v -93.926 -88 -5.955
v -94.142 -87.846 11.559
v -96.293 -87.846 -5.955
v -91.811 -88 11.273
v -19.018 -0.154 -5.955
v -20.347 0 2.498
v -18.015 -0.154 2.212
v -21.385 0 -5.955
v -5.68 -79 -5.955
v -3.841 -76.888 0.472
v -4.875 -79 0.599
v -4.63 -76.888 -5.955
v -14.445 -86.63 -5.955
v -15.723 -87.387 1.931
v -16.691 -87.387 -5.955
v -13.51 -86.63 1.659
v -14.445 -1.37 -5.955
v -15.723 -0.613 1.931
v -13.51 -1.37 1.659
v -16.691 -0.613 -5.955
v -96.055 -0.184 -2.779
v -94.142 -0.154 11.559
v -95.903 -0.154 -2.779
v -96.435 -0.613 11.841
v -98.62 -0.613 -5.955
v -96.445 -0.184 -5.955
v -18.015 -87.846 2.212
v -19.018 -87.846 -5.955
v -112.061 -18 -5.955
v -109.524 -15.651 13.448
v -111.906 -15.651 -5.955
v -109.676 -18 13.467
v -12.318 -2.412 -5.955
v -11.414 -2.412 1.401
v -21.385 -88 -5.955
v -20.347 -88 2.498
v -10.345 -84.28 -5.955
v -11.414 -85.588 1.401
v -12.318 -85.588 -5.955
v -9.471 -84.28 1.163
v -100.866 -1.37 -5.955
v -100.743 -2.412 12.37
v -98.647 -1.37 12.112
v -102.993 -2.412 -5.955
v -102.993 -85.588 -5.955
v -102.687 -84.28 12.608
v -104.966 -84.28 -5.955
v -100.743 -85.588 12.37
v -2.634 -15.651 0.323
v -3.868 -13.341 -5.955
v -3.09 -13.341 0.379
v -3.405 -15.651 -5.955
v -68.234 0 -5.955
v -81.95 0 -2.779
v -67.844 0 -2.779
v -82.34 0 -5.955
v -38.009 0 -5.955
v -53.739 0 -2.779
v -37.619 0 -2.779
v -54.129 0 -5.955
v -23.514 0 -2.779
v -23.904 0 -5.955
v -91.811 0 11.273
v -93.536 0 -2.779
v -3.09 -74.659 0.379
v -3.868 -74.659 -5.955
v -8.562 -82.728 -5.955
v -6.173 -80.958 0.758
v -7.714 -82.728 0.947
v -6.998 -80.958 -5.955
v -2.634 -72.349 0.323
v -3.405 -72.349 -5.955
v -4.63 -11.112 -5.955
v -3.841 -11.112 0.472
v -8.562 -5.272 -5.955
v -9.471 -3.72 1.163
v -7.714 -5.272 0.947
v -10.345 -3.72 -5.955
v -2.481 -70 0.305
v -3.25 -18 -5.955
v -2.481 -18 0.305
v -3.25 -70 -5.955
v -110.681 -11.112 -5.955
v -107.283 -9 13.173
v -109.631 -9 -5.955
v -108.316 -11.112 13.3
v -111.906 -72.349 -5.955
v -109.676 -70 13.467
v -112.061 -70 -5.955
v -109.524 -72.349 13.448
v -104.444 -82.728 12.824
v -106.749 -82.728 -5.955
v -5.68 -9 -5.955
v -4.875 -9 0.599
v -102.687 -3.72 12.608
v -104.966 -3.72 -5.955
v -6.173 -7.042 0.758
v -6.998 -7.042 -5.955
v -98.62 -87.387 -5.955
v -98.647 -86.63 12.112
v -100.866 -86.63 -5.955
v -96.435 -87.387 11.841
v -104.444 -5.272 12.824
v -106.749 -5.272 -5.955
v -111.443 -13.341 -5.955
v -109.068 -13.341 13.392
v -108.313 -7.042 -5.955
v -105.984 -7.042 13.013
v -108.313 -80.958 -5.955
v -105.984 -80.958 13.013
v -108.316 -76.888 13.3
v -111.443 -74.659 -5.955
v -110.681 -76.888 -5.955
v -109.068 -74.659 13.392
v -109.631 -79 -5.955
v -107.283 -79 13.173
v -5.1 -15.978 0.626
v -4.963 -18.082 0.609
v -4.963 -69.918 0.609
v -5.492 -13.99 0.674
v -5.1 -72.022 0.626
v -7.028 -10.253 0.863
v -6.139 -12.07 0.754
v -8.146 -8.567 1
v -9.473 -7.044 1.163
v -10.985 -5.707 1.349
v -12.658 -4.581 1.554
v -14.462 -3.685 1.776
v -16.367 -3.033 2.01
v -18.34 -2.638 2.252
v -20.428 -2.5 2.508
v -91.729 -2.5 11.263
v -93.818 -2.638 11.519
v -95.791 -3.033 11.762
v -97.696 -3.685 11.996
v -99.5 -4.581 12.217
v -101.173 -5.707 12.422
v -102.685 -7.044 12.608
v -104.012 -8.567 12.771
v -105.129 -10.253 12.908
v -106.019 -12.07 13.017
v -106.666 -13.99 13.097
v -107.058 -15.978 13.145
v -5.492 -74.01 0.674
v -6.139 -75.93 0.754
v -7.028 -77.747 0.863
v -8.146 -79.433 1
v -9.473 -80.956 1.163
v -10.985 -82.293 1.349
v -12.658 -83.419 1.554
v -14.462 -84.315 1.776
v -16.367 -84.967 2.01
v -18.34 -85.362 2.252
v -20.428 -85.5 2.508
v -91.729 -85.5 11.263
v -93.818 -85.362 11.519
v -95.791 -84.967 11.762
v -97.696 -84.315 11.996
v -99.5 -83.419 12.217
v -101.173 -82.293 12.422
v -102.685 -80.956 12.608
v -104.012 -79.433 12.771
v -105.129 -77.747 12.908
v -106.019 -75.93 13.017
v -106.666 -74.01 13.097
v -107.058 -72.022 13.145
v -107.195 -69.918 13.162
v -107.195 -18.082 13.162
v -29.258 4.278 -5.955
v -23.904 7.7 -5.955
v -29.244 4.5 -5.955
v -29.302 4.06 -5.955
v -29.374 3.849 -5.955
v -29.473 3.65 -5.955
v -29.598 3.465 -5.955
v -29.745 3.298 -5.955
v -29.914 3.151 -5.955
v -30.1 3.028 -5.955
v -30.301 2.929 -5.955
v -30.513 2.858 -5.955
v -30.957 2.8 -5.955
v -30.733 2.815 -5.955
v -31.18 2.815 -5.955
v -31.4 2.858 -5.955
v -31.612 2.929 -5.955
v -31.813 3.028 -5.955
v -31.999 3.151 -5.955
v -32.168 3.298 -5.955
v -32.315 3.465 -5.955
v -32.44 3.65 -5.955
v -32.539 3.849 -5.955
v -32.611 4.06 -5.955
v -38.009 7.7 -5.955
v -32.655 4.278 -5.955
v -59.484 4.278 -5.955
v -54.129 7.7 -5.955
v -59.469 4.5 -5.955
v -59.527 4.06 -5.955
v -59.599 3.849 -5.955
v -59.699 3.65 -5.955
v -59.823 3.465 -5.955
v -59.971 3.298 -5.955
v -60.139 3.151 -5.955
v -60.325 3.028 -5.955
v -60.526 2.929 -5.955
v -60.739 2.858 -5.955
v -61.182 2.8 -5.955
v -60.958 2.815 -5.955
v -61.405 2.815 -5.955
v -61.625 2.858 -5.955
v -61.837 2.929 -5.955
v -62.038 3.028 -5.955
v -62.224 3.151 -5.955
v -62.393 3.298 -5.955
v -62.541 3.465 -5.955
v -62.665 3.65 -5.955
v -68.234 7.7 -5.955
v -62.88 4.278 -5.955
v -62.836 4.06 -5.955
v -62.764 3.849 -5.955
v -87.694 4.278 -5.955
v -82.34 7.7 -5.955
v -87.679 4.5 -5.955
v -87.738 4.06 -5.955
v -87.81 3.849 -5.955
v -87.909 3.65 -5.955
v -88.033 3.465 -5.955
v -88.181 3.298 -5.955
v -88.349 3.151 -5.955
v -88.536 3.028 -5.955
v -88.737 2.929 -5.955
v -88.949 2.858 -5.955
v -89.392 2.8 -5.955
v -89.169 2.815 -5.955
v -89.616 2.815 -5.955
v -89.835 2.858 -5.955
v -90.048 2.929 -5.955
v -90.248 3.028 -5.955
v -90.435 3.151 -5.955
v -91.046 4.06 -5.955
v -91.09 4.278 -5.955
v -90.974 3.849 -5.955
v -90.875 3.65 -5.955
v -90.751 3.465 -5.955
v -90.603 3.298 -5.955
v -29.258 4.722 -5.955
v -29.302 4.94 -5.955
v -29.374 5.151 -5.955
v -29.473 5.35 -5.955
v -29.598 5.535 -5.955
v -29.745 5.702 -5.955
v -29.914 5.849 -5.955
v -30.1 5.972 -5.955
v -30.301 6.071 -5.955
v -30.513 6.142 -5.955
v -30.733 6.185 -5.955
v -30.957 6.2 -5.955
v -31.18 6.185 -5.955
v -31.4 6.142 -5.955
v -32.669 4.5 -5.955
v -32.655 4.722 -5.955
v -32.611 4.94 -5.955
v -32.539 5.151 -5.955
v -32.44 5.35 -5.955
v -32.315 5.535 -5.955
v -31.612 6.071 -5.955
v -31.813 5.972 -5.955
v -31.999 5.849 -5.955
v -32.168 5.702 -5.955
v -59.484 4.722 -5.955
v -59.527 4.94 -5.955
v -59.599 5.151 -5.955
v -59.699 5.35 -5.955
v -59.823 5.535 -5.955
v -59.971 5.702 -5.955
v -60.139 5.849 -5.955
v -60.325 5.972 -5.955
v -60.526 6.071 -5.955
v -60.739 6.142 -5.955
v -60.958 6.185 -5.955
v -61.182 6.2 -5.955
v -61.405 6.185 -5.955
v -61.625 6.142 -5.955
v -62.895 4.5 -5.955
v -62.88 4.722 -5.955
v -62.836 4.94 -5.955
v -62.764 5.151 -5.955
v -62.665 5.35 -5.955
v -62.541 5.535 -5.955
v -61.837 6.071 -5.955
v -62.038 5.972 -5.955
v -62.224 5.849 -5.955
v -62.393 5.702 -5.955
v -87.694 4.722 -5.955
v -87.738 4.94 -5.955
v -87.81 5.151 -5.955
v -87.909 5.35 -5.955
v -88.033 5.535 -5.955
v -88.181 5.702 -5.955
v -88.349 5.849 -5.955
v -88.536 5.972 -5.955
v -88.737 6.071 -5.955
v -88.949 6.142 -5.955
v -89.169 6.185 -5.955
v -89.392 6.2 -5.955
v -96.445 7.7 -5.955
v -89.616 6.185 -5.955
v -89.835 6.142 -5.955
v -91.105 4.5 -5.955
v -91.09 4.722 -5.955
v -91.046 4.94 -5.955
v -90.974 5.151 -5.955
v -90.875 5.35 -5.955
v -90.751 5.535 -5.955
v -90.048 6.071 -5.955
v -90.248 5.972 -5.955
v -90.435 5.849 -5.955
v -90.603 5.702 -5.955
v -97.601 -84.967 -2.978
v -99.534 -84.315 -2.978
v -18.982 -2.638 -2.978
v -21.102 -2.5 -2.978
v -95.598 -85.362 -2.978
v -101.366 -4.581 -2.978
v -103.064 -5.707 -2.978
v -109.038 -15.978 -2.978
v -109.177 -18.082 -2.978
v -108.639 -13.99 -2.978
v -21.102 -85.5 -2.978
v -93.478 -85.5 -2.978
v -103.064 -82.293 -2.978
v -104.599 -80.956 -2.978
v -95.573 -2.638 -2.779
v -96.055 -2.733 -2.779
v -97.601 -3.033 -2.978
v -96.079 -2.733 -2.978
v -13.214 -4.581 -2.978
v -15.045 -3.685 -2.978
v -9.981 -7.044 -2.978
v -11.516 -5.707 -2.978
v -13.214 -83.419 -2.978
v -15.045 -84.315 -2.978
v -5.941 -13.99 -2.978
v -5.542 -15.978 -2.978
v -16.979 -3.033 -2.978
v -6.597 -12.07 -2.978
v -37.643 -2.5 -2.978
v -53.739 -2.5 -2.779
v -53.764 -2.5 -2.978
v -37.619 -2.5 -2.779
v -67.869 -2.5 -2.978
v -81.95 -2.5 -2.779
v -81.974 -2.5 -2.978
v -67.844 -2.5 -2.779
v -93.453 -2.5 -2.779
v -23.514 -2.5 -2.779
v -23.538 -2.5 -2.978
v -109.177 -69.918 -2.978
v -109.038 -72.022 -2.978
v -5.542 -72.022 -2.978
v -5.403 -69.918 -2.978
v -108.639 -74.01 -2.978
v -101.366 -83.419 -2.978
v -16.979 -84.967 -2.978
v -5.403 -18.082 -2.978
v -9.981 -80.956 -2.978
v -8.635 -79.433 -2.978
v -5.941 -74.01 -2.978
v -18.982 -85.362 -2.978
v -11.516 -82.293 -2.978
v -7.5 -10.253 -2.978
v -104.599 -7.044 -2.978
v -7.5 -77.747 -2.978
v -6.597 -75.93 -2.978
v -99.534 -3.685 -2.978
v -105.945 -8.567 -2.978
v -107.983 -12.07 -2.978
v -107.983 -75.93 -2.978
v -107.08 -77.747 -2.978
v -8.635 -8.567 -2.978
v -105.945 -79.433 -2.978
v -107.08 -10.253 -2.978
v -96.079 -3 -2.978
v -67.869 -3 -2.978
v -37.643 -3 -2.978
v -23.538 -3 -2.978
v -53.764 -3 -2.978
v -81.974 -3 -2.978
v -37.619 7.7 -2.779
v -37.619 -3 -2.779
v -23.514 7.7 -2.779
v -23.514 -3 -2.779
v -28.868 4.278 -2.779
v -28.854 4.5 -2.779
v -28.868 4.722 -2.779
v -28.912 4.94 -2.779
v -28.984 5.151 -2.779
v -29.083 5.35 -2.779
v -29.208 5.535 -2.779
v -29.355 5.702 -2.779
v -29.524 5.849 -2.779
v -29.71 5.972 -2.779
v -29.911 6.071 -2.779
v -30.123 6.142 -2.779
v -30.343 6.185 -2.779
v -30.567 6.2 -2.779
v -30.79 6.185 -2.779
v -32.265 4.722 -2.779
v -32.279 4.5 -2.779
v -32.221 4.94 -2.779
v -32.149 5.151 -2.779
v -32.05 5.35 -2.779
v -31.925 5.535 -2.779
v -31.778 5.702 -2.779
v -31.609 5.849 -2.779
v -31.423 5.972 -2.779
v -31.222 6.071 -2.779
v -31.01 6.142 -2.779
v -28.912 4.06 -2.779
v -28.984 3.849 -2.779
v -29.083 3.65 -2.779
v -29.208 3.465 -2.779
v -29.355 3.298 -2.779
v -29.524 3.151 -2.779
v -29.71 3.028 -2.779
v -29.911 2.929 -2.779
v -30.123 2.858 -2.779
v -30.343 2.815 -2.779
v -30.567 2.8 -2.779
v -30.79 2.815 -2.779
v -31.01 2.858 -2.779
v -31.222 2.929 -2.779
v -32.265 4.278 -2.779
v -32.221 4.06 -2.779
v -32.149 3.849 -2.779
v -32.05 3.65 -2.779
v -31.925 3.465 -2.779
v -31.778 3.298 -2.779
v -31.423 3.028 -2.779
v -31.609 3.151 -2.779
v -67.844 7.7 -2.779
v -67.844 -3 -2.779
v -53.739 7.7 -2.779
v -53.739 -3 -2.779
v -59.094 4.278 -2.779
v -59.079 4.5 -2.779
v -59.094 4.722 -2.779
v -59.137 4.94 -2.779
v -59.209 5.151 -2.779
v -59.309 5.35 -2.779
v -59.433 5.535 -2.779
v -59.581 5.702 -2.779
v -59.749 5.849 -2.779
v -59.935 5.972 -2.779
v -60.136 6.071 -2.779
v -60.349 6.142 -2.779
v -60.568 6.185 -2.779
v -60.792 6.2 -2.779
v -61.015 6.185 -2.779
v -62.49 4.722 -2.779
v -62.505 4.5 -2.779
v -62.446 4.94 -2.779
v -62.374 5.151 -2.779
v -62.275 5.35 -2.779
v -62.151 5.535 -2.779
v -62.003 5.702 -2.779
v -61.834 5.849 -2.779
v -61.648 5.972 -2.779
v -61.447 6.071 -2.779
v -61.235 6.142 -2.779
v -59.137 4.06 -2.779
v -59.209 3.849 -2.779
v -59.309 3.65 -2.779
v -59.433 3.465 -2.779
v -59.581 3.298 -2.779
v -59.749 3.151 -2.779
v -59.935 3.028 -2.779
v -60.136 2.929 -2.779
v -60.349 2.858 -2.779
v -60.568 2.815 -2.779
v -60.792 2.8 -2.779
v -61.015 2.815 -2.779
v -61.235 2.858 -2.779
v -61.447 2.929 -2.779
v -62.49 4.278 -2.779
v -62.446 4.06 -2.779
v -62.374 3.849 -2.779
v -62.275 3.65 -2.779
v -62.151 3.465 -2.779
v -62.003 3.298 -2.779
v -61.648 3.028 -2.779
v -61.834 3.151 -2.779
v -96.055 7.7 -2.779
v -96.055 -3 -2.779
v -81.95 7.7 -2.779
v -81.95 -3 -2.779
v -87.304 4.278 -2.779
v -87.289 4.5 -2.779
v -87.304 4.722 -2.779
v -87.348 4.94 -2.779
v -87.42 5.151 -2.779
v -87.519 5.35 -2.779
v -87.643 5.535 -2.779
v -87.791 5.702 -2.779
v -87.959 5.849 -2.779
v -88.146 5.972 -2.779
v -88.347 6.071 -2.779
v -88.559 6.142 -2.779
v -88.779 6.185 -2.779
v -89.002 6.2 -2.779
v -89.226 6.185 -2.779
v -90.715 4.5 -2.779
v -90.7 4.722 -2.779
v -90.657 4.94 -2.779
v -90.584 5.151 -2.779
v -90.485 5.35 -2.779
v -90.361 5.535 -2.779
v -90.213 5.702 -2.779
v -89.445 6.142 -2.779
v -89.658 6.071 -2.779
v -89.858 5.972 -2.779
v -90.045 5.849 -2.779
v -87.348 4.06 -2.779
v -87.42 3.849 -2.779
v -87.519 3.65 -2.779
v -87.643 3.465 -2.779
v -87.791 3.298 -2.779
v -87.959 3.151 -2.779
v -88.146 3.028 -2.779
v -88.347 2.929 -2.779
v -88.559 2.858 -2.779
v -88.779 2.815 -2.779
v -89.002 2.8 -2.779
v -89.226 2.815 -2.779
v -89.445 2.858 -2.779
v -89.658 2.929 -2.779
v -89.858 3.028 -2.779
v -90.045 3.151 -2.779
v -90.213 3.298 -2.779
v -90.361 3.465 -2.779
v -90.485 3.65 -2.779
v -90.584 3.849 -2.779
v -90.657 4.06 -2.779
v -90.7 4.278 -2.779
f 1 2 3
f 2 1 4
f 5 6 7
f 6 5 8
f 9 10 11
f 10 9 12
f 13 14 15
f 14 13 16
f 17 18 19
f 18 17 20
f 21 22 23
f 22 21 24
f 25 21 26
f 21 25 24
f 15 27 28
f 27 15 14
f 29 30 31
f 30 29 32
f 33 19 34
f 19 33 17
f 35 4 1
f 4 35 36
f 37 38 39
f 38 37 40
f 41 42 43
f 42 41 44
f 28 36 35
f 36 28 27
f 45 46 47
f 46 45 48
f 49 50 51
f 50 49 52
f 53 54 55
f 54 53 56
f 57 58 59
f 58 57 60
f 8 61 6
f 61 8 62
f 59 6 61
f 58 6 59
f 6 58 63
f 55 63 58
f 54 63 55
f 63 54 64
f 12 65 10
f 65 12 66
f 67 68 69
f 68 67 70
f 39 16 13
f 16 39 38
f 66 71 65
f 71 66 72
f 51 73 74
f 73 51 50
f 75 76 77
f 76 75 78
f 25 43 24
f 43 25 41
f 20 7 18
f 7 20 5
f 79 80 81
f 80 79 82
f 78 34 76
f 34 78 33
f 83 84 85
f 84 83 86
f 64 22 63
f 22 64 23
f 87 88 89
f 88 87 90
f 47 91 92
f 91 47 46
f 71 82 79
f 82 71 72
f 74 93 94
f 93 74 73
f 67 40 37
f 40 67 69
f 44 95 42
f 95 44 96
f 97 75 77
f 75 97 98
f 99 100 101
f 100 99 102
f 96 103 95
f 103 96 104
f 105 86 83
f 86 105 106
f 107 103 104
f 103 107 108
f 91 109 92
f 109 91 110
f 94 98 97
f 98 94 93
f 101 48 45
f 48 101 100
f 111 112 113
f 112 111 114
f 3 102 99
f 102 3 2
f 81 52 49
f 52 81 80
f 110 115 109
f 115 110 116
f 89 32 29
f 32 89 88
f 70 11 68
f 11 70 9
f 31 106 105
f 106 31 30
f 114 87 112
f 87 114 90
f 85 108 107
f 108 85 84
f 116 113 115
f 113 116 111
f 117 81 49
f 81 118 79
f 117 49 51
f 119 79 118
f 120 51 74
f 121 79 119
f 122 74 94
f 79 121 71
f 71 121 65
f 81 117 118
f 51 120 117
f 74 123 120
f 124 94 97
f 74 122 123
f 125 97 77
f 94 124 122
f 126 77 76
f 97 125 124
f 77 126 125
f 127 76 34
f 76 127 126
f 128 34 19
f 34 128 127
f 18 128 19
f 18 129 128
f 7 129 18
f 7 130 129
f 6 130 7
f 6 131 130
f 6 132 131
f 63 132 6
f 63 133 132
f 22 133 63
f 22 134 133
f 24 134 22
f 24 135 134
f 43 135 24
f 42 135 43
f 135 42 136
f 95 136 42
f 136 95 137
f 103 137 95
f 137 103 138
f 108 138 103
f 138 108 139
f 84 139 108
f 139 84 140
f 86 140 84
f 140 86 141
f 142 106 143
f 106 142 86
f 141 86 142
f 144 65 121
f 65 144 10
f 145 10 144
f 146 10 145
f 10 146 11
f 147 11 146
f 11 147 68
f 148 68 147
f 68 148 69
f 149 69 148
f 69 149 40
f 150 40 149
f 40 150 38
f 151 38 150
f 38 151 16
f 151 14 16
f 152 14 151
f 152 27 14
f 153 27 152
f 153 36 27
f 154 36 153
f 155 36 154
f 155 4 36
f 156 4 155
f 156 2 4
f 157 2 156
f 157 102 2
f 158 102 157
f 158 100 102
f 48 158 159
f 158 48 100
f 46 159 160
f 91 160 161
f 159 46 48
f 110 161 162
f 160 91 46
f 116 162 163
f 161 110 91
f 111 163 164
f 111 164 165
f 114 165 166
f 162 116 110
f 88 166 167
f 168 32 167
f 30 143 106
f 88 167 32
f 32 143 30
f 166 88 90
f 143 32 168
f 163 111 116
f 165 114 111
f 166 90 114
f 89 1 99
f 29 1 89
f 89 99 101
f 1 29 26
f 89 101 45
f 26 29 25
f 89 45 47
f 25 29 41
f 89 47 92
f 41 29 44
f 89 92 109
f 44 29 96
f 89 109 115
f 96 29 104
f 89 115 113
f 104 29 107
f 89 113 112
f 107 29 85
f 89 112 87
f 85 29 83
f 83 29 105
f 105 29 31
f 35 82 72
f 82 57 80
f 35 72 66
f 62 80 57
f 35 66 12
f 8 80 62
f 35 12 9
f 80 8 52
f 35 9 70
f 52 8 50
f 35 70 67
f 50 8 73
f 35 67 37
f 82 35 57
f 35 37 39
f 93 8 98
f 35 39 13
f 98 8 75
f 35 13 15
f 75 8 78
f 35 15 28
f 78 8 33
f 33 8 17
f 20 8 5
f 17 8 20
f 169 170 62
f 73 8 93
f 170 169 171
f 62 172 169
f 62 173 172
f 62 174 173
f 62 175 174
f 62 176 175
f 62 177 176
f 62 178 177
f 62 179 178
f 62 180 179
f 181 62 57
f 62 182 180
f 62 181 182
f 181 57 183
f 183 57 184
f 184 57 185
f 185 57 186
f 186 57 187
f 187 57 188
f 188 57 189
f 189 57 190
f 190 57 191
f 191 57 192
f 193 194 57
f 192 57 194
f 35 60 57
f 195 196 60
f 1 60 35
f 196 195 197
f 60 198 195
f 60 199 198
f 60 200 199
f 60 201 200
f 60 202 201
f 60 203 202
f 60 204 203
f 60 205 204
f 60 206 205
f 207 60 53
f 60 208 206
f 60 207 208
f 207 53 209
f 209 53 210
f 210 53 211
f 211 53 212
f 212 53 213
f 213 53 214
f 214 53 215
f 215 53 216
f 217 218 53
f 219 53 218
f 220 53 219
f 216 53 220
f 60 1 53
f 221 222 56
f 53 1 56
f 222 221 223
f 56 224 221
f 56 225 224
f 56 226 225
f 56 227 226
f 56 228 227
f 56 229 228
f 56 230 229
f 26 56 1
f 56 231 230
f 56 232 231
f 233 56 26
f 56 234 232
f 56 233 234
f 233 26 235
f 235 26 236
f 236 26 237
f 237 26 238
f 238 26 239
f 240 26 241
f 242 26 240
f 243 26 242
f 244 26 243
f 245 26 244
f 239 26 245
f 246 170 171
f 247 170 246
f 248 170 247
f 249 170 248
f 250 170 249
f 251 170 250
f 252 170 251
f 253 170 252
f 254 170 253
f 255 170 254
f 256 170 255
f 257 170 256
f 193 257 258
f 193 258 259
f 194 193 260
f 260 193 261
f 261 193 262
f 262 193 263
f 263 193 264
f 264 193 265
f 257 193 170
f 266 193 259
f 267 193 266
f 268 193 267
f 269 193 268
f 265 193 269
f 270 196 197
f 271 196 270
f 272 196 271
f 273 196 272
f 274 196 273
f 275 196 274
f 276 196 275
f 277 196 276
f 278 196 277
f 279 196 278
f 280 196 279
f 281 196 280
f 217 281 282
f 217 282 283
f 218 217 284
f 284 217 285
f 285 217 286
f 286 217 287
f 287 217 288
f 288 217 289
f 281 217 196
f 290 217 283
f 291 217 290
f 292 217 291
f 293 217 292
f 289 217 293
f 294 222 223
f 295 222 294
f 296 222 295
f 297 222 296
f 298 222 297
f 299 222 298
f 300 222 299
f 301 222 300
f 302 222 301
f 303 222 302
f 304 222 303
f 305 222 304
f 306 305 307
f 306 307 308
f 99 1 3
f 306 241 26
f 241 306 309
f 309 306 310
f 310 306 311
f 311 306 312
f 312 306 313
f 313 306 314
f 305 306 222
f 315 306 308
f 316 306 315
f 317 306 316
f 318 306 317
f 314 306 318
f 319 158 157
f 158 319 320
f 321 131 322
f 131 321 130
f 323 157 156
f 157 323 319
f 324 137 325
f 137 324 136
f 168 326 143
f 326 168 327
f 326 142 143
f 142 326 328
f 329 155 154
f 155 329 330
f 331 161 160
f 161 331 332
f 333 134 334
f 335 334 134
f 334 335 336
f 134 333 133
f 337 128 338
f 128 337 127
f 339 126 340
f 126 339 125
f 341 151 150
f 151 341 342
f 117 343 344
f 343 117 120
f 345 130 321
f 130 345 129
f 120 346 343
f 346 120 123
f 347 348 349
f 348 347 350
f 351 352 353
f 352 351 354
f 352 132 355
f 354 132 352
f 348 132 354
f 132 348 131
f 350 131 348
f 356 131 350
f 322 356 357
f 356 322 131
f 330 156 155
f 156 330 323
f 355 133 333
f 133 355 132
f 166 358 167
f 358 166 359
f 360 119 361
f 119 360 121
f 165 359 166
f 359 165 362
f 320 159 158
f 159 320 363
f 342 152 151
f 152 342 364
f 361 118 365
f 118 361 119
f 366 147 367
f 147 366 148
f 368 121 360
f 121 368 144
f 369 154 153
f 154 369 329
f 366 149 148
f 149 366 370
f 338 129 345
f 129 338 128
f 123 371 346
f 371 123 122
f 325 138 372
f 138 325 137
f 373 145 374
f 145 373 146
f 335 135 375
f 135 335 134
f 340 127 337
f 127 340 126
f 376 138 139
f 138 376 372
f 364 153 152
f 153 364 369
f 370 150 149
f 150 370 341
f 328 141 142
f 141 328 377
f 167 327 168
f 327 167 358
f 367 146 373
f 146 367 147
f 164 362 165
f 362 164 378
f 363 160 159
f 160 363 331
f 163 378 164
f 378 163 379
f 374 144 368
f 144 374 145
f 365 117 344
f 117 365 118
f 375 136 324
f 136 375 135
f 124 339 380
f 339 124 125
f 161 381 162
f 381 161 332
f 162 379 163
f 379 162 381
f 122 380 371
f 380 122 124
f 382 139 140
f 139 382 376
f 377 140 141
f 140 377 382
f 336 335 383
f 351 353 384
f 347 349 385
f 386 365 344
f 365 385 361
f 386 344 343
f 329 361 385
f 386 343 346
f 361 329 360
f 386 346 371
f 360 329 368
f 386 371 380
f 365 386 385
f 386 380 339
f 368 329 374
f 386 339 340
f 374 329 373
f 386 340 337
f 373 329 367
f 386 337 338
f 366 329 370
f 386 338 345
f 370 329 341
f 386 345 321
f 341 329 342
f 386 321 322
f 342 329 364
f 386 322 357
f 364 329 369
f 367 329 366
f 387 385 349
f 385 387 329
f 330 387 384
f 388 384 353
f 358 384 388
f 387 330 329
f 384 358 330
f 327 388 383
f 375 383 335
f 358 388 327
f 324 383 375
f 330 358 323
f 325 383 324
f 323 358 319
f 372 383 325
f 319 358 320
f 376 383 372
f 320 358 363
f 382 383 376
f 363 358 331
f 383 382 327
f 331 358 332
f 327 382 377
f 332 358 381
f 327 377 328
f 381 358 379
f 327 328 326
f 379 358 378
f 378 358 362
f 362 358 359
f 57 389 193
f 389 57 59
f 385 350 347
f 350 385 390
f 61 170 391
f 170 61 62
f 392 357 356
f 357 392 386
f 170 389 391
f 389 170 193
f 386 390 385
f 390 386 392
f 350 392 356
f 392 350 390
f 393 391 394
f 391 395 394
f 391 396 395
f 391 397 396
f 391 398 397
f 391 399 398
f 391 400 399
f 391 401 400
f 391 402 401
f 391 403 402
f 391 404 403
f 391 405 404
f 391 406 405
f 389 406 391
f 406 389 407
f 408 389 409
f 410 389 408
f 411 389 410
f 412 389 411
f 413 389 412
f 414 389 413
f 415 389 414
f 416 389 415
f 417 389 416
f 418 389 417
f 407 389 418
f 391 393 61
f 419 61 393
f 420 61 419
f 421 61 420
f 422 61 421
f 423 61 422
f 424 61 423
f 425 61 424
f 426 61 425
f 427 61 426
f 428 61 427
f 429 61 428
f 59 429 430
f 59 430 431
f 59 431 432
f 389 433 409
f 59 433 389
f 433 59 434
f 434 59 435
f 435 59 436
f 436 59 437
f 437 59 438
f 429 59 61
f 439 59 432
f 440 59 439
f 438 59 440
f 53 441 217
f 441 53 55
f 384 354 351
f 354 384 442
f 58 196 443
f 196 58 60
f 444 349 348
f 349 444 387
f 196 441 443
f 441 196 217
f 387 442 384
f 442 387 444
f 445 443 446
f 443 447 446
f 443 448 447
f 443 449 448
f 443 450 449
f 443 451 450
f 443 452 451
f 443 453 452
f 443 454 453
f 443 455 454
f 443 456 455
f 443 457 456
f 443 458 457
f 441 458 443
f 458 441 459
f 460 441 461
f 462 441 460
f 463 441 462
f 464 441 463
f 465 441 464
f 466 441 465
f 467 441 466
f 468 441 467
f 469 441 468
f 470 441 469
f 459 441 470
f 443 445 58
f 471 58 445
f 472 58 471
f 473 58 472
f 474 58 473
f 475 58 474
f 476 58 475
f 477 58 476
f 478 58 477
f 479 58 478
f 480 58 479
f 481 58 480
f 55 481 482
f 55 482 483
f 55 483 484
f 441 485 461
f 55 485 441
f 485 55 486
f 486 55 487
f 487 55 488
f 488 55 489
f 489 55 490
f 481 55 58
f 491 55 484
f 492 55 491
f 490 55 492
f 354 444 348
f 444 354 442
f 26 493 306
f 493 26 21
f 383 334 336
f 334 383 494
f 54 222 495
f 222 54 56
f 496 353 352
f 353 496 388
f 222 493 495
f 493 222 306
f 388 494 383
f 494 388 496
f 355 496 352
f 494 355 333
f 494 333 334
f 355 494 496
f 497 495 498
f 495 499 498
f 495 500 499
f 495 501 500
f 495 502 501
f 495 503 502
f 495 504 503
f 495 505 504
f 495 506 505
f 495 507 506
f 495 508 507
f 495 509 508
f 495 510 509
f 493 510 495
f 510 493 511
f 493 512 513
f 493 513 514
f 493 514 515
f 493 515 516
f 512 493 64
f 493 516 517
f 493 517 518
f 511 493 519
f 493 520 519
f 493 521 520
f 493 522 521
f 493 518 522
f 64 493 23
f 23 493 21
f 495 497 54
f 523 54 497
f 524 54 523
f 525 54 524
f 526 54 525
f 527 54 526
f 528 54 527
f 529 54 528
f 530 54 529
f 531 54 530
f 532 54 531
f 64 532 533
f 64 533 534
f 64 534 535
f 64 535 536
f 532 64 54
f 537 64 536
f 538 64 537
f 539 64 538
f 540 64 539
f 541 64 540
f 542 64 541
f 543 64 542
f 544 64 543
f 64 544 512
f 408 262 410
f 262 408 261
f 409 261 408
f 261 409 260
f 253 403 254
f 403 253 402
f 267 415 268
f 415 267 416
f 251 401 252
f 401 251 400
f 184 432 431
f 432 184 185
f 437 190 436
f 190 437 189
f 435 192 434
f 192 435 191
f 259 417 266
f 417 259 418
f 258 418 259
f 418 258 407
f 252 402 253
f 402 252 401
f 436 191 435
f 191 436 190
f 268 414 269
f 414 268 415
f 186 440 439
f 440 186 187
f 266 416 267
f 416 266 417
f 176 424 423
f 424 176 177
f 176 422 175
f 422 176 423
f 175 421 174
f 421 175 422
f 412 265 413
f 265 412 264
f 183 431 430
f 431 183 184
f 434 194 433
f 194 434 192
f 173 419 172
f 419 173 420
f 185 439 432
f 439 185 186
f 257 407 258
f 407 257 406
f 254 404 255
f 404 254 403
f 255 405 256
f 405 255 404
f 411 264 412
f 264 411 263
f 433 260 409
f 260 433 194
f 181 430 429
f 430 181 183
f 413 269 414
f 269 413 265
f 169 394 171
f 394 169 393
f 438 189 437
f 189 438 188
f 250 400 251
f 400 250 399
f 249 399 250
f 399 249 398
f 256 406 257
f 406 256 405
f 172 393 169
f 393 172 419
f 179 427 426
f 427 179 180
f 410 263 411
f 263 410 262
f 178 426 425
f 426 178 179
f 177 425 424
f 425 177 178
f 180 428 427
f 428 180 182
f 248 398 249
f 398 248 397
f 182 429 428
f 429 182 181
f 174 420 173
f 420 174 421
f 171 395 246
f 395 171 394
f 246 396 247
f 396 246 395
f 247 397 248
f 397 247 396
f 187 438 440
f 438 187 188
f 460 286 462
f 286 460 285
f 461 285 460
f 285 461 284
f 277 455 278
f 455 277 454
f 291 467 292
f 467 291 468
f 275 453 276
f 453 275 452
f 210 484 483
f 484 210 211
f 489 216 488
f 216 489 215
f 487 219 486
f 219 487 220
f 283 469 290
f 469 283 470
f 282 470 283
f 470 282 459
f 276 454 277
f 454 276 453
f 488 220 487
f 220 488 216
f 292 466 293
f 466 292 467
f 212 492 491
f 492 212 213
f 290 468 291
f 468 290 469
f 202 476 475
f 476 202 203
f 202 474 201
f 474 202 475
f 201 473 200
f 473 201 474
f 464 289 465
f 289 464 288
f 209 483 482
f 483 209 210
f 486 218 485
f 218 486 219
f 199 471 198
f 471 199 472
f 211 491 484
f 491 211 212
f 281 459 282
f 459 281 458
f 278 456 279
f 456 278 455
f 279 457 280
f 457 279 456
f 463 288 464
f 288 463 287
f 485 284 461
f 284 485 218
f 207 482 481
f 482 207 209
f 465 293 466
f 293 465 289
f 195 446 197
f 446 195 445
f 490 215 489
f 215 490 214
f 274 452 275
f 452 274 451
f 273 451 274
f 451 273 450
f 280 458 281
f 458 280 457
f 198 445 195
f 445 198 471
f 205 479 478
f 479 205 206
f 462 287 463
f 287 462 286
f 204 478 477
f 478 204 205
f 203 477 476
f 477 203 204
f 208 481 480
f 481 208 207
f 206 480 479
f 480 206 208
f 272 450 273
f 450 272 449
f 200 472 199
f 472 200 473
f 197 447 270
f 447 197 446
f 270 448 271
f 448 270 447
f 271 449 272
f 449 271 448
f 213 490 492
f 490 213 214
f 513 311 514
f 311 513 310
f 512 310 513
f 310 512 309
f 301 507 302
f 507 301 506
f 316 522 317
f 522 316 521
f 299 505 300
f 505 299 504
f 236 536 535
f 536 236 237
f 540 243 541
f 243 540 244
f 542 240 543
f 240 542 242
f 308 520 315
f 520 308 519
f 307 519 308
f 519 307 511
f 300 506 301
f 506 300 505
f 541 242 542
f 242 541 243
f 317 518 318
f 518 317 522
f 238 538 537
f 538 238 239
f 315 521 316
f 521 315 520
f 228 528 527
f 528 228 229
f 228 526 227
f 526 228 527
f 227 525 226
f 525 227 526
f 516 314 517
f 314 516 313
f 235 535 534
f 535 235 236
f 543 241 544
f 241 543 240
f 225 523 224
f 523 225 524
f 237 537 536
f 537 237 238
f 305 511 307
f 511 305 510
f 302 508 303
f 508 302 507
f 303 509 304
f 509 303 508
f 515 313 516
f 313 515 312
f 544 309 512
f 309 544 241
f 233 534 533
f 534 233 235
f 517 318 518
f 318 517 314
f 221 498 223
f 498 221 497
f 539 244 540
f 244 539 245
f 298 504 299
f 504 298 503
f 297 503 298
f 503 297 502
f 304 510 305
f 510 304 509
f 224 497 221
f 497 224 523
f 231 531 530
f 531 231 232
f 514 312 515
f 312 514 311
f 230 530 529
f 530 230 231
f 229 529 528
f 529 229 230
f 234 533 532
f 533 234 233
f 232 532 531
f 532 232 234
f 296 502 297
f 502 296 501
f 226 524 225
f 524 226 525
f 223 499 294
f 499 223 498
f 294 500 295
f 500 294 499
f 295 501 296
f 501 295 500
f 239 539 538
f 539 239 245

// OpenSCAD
// file: ../keyball61_outline.scad
// 自動生成: scripts/extract_outline.py による Keyball61 BallSide 底板の実寸データ
// 座標系: 左手ユニットを上から見た形 / 原点=外形バウンディングボックスの南西角 / +Y=奥(北)
// 編集しないこと。再生成: python3 scripts/extract_outline.py <DXF>
plate_w = 142.99;
plate_d = 113.53;
plate_outline = [
  [70.469,105.952],
  [71.227,105.880],
  [80.812,104.031],
  [81.588,103.958],
  [100.075,104.045],
  [100.583,104.091],
  [119.410,107.418],
  [119.914,107.553],
  [136.160,113.466],
  [136.328,113.511],
  [136.502,113.527],
  [136.676,113.511],
  [136.844,113.466],
  [137.002,113.393],
  [137.145,113.293],
  [137.268,113.169],
  [137.368,113.027],
  [137.442,112.869],
  [142.931,97.786],
  [142.980,97.597],
  [142.990,97.401],
  [142.963,97.207],
  [142.898,97.022],
  [142.798,96.853],
  [142.667,96.707],
  [142.510,96.589],
  [142.334,96.505],
  [134.323,93.589],
  [133.849,93.368],
  [133.421,93.068],
  [133.051,92.698],
  [132.751,92.270],
  [132.530,91.796],
  [132.395,91.291],
  [132.349,90.770],
  [132.349,66.014],
  [132.366,65.834],
  [132.414,65.660],
  [132.493,65.498],
  [132.600,65.353],
  [132.731,65.228],
  [132.882,65.130],
  [133.048,65.060],
  [133.215,64.991],
  [133.367,64.892],
  [133.498,64.768],
  [133.604,64.623],
  [133.683,64.461],
  [133.732,64.286],
  [133.748,64.107],
  [133.748,29.050],
  [133.748,6.000],
  [133.729,5.805],
  [133.672,5.618],
  [133.580,5.445],
  [133.455,5.293],
  [133.304,5.169],
  [133.131,5.076],
  [132.943,5.019],
  [132.748,5.000],
  [95.252,5.000],
  [95.056,4.981],
  [94.869,4.925],
  [94.696,4.832],
  [94.544,4.707],
  [94.420,4.556],
  [94.328,4.383],
  [94.271,4.195],
  [94.252,4.001],
  [94.252,3.501],
  [94.232,3.305],
  [94.175,3.118],
  [94.083,2.945],
  [93.959,2.793],
  [93.807,2.669],
  [93.634,2.577],
  [93.447,2.520],
  [93.251,2.500],
  [76.201,2.500],
  [76.006,2.481],
  [75.819,2.424],
  [75.646,2.332],
  [75.494,2.207],
  [75.370,2.056],
  [75.277,1.883],
  [75.220,1.696],
  [75.201,1.500],
  [75.201,1.001],
  [75.182,0.805],
  [75.125,0.617],
  [75.033,0.445],
  [74.908,0.293],
  [74.757,0.169],
  [74.584,0.077],
  [74.396,0.019],
  [74.201,0.000],
  [58.151,0.000],
  [57.977,0.015],
  [57.809,0.061],
  [57.651,0.134],
  [57.508,0.234],
  [57.385,0.358],
  [57.285,0.500],
  [57.211,0.658],
  [57.166,0.827],
  [57.151,1.001],
  [57.151,3.700],
  [57.132,3.895],
  [57.075,4.083],
  [56.982,4.256],
  [56.858,4.407],
  [56.706,4.532],
  [56.534,4.624],
  [56.346,4.681],
  [56.151,4.700],
  [39.101,4.700],
  [38.927,4.715],
  [38.758,4.761],
  [38.600,4.834],
  [38.458,4.935],
  [38.334,5.057],
  [38.235,5.200],
  [38.161,5.358],
  [38.116,5.527],
  [38.101,5.700],
  [38.101,10.700],
  [38.081,10.895],
  [38.024,11.083],
  [37.932,11.256],
  [37.808,11.408],
  [37.656,11.532],
  [37.483,11.624],
  [37.296,11.681],
  [37.101,11.701],
  [19.050,11.701],
  [1.000,11.701],
  [0.805,11.720],
  [0.617,11.777],
  [0.445,11.869],
  [0.293,11.993],
  [0.168,12.145],
  [0.076,12.317],
  [0.019,12.506],
  [0.000,12.701],
  [0.000,104.952],
  [0.015,105.125],
  [0.060,105.294],
  [0.134,105.452],
  [0.234,105.595],
  [0.357,105.718],
  [0.500,105.818],
  [0.658,105.892],
  [0.826,105.937],
  [1.000,105.952],
  [19.050,105.952]
];
// [x, y, 直径] : d=11.3 はボール取出し穴, d=2.08 は M2, d=2.36 はボールケース部
plate_holes = [
  [71.961,95.252,12.0],
  [61.104,103.252,2.5],
  [61.104,87.252,2.5],
  [56.455,61.351,2.2],
  [128.785,88.912,2.2],
  [57.292,18.55,2.2],
  [18.773,87.402,2.2],
  [18.773,30.251,2.2],
  [94.556,21.051,2.2],
  [95.392,61.651,2.2],
  [120.871,101.715,2.2]
];
// file: ../params.scad
// ============================================================
// Keyball61 ラップボード(膝上ケース・固定式) 共通パラメータ
// 座標系: X+ = 右(東), Y+ = 奥(北), Z+ = 上
// 組立座標系(グローバル): 中心 x=0, 手前が y小
// ============================================================

clr = 0.35;           // はめあいクリアランス(片側)

// ---------- 全体レイアウト(固定) ----------
splay        = 10;    // ハの字角(固定)。変更したら全パーツ再印刷
tent_angle   = 7;     // テンティング角(内側が高い)
kb_corner_x  = 45;    // キーボードブロック後内側コーナーの中心からの距離(=後方ギャップの半分)
kb_corner_y  = 238;   // 同コーナーのY

// ---------- サイドピース(キーボードブロック+パームレスト) ----------
kb_wall      = 6;     // ポケット周囲の壁厚
wedge_t0     = 6;     // 楔の最低肉厚(外側端)
palm_w       = 108;   // パームレスト幅。親指側(内側)を削って印刷を安定させる
palm_x0      = 2.5;   // パームの外側エッジ位置(kbフレームx)。外側基準で幅を詰める
palm_d       = 88;    // 同奥行き
palm_overlap = 3;     // キーボードブロックへの食い込み
palm_r       = 18;    // 角R
// ブレース南帯のネジ座/座面が載る内側エッジ沿いの支持アーム
// (パームを削ってもブレース・ブリッジとの接合部を変えないために残す)
palm_arm_w   = 14;    // アーム幅(継ぎ目から西へ)
palm_arm_y0  = -32;   // アーム南端(kbフレームy)
palm_fillet  = 22;    // アーム〜パーム間の凹R(尖り解消の滑らかな輪郭)
// キーボードは「ベッド直接印刷の2mm取付プレート」(mount_plate)に純正ネジで固定し、
// プレートごとポケットに落としてM3x8皿でサイドに固定する。
// (楔内部の座ぐり奥の2mm肉は印刷精度が出ずネジ固定に失敗したため=実印刷での知見)
plate_t      = 2;     // 取付プレート厚(=アクリル板厚。純正ネジ長がそのまま使える)
pocket_depth = 4.6;   // ポケット深さ = plate_t + 縁2.6
// プレート固定ネジ位置(プレート座標系, M3x8皿セルフタップ x4/側)
// 組立順: 先にプレート単体をサイドへ上から固定 → キーボードをΦ8貫通穴経由で下から純正ネジ止め
plate_screws = [[35, 14], [95, 14], [35, 96], [105, 99]];
kb_head_hole_d = 8;   // M2/ボールケースネジ頭の逃げ穴(サイド側, 貫通=下から増し締め可)

ball_hole_d  = 12;    // ボール取出し穴(アクリルは11.3)

// 取付プレートの穴径
m2_hole_d  = 2.4;     // M2クリアランス(プレート側)
bc_hole_d  = 2.8;     // ボールケースネジ(プレート側, アクリルは2.36)

// ボールPCB切り欠き部の逃げ(取付面からさらに掘り下げる深さ)
notch_relief = 4;

// ---------- 中央ブリッジ ----------
bridge_t     = 8;     // ブリッジ板厚
bridge_y0    = 88;    // 南端(ここより手前の中央は開放空間)
bridge_y1    = 250;   // 北端
seam_clr     = 0.5;   // サイドとの隙間
ledge_w      = 25;    // 継手タブ幅(サイド下面のポケットに入る)
ledge_t      = 3.6;   // タブ厚
tab_len      = 26;    // タブの継ぎ目方向長さ(サイド側ポケット天井のブリッジ距離。
                      //  ポケットは前後の壁で両端支持されるのでサポート不要)
joint_screw_ys = [110, 165, 220];  // 継手ネジのY(斜め継ぎ目沿い・片側3本)
joint_screw_inset = 10;            // 楔エッジからネジ中心までの距離
joint_y0 = 95;                     // 連続タブのY範囲
joint_y1 = 235;
// リブ入り連続継手: サイドの連続タブ(凸)の切り欠きに、ブリッジ側ポケット(凹)内の
// リブが噛み合う。リブがポケット天井の中間支柱になり、ブリッジは
// 両端支持の約28mmブリッジ×5区間でサポート不要のまま連続かみ合いにできる
joint_rib_ys = [122.7, 150.9, 179.1, 207.3];  // リブ中心Y(ネジ位置を回避)
joint_rib_w  = 3;                  // リブ幅(サイド側切り欠きは +2*clr)

// ---------- ブレースプレート(上側の左右連結・箱構造化) ----------
// ポッドの上を跨いで左右サイドの内壁上面に渡し、M3x8皿セルフタップ x2/側で固定。
// OLED/ProMicro部(奥側)を避けた範囲に架ける
brace_t       = 3.5;   // プレート厚
brace_y0      = 100;   // 南端
brace_y1      = 230;   // 北端(ケーブル類はブレースの上か切り欠き部を通す)
// TRSジャック(グローバル x≈∓72, y≈181, KiCad基板から実測)のプラグ/ケーブルが
// 降りてくるゾーンを、左右エッジの切り欠きで大きく避ける(H形)
brace_notch_y0 = 168;  // 切り欠きY範囲
brace_notch_y1 = 212;
brace_notch_keep = 37; // 切り欠き部で残す中央帯の半幅
brace_shelf_z = 22.2;  // サイド側座面の高さ(バッテリー版ポッド上面21.4+0.8クリア)
brace_shelf_w = 10;    // 座面幅(継ぎ目から内側へ)
brace_overlap = 9.5;   // プレートが座面に乗る幅(段差壁との隙間はブリッジ継ぎ目と同じ0.5mm)
brace_screw_ys = [108, 154, 221];  // 固定ネジY(片側3本)
// 親指キークラスタの張り出し回避: 南ネジと中央ネジの間のエッジを少し中央寄りに後退
brace_thumb_y0    = 114;  // 回避Y範囲
brace_thumb_y1    = 147;
brace_thumb_inset = 12;   // 継ぎ目から中央側への後退量
brace_screw_inset = 5;        // 継ぎ目からネジ中心までの距離

// M3 (継手・ポッド固定)
m3_hole_d  = 3.4;
m3_cs_d    = 6.8;     // 皿ざぐり径
m3_nut_af  = 5.8;     // 六角ナットポケット対辺(M3ナット5.5+0.3)
m3_nut_t   = 2.9;     // 同深さ

// ---------- Touch ID ポッド ----------
// 実測値(2026-08-14): 基板 85x31x3 / ボタン 16x16x3 / ポート 19x3.1
// 薄型バッテリー 123x30x3 (有りの場合は基板の下に縦積み)
tid_battery = false; // バッテリー版は -D tid_battery=true で生成 (make で両STL生成)
tid_bat_l  = 123;
tid_bat_t  = 3;
tid_bay_w  = 34;    // ベイ幅   (基板短辺31 + 余裕)
tid_bay_d  = tid_battery ? tid_bat_l + 3 : 88;  // ベイ奥行
tid_bay_h  = tid_battery ? 7 : 4;               // 電池3+基板3+余裕 / 基板3+余裕
tid_btn_in_lid = false; // ボタンはケーブル延長してキーボード側に配置予定のため蓋穴なし
                        // (蓋にボタンを出す場合は true に)
tid_btn_w  = 16;    // センサーボタン一辺(正方形) → 蓋の角穴 = +2*clr
tid_btn_x  = 0;     // ベイ中心からのボタン中心オフセットX
tid_btn_y  = -28;   // 同Y(手前が負)。※ボタン実位置に合わせて調整
tid_port_w = 20;    // 充電ポート開口幅(南面, 上開きスロット) 実測19 / 0で無効
tid_port_off = 0;   // ポート左右オフセット(※あとで調整)
tid_pedestal_h = 0; // ボタン下の台座高さ(0=無効)
tid_wall   = 3;
tid_lid_t  = 2.4;

pod_screw_span = 48;  // フランジ穴スパン(ブリッジの穴と一致)
pod_y          = 178; // ブリッジ側の取付穴Y(両バージョン共通・固定)
// バッテリー版はベイが南へ伸びるぶんフランジ穴をオフセットし、
// 取付穴とポッド北端を両バージョンで揃える
pod_flange_off = tid_battery ? 19 : 0;

$fn = 48;
// file: ../lib.scad
// 共通モジュール
include <params.scad>
include <keyball61_outline.scad>

// キーボードブロック外形(kbローカル座標系)
kbw = plate_w + 2 * kb_wall;   // 幅
kbd = plate_d + 2 * kb_wall;   // 奥行き

// ---- テンティング用の傾斜半空間(kbローカル座標系) ----
// 上面平面: z = wedge_t0 + dz + x*tan(tent_angle)  (x=0 が外側=低い側)
module halfspace_below_top(dz = 0) {
    translate([0, 0, wedge_t0 + dz])
        rotate([0, -tent_angle, 0])
            translate([-1000, -500, -2000]) cube([3000, 2000, 2000]);
}
module halfspace_above_top(dz = 0) {
    translate([0, 0, wedge_t0 + dz])
        rotate([0, -tent_angle, 0])
            translate([-1000, -500, 0]) cube([3000, 2000, 2000]);
}

// kbローカルxにおける上面/ポケット床の高さ
function kb_top_z(x) = wedge_t0 + x * tan(tent_angle);
function pocket_floor_z(x) = kb_top_z(x) - pocket_depth;

// 継ぎ目: 左サイドの楔内側エッジのX(グローバル, 正値で返す)
// エッジは (kb_corner_x, kb_corner_y) から南へ向かって splay だけ開く
function seam_x(y) = kb_corner_x + (kb_corner_y - y) * tan(splay);

// ---- プレート外形(左手ユニット・上面視) ----
// DXFの描画は「右手ユニット上面視を180°回転」した状態なので、
// Y反転すると左手ユニット上面視(手前=ボール側, 奥=MCU/USB側)になる
module plate2d(off = 0) {
    translate([0, plate_d]) mirror([0, 1]) {
        if (off > 0) offset(r = off) polygon(plate_outline);
        else polygon(plate_outline);
    }
}

// Y反転済みの穴リスト [x, y, d]
plate_holes_f = [for (h = plate_holes) [h[0], plate_d - h[1], h[2]]];

// ---- 角丸長方形 ----
module rounded_rect(w, d, r) {
    offset(r = r) offset(delta = -r) square([w, d]);
}

// ---- M3 六角ナットポケット 原点=軸, z=0から上へ掘る ----
module m3_nut_pocket() {
    translate([0, 0, m3_nut_t/2 - 0.01])
        cylinder(d = m3_nut_af / cos(30), h = m3_nut_t + 0.02, center = true, $fn = 6);
}

// ---- M3 皿ネジ穴 原点=軸/z=0が頭側表面, 下向きに掘る ----
module m3_countersunk(depth) {
    translate([0, 0, -depth - 0.01]) cylinder(d = m3_hole_d, h = depth + 0.02);
    translate([0, 0, -(m3_cs_d - m3_hole_d)/2]) cylinder(d1 = m3_hole_d, d2 = m3_cs_d, h = (m3_cs_d - m3_hole_d)/2 + 0.01);
    translate([0, 0, -0.005]) cylinder(d = m3_cs_d, h = 5);
}
// file: v3_params.scad
// v3 モジュラー構造(中空箱+縦壁フランジ結合)の追加パラメータ
// ベース寸法・外形・レイアウトは ../params.scad / ../keyball61_outline.scad を共用
include <../lib.scad>

v3_wall     = 2.5;   // 箱の壁厚
v3_top      = 3;     // 天板厚(プレート座の下)
v3_joint_clr = 0.2;  // 箱同士の合わせ面クリアランス
// ジョイントは全て「垂直M3x8なべ + 横挿しナットスロット」方式。
// 上からドライバーで締結でき、ナットはスロットに事前挿入して回り止め。
// スロット天井2.5mmが締結面。ナットの対角(6.35)が軸の真下まで届く奥行きを取る
v3_slot_w = 5.9;   // ナットスロット幅(M3対辺5.5+0.4)
v3_slot_t = 2.7;   // 同厚(ナット2.4+0.3)

// KB箱⇔中央箱: KB東壁の切り欠き+受けボスへ中央箱のデッキ面一タブから縦M3
v3_cj_ys  = [120, 170, 220];

// KB箱⇔パーム箱: KB南壁の切り欠き+受けボスへパーム天板面一タブから縦M3
v3_pj_xs   = [30, 60, 88];  // パーム幅(2.5..110.5)内かつKB南壁上

// パーム箱(kbフレーム, KB箱の南に接続)
v3_palm_w  = 108;
v3_palm_x0 = 2.5;
v3_palm_d  = 88;

// 中央箱
v3_cbox_h  = 16;    // 高さ(トーションボックス。ブリッジ+ブレースの代替)
v3_cbox_y0 = 88;
v3_cbox_y1 = 250;
// 底蓋(あと付け可): 内周に収まる台形板をボス柱4本にM3x8皿で固定(頭は底面ツライチ)
v3_lid_t = 2.5;
v3_lid_bosses = [[-28, 95], [28, 95], [-28, 230], [28, 230]];  // ベルクロスロット(y242)を回避
// 結束バンド用スロット対 [中心x, 中心y]: 3x7の縦穴2個(±4.75mm)を1組として天板に開ける
v3_tie_pairs = [[-40, 120], [40, 120], [-40, 205], [40, 205]];
// file: v3_palm_box.scad
// v3 パームボックス: 差し替え式の楔シェル(リブなし・底面開放)。
// 「天面をベッドに伏せて」印刷すればブリッジゼロ(partsファイルで180°±tent回転済み)。
// 北端: 天板と面一のタブx3(厚3.2, 上面=楔面=印刷時のベッド接地面)が
// KBフレーム南壁の切り欠きに載り、
// 上から縦M3x8なべ→KB側ボスの横挿しナットスロットで締結(皿もみなしの
// ストレート穴。薄タブの縁を残して座面強度を確保)。頭はジェルパッドの下。
// kbフレーム基準(北端 y=0, タブは y>0 へ張り出す)。
include <v3_params.scad>

module v3_palm_fp2d() {
    translate([v3_palm_x0, -v3_palm_d]) rounded_rect(v3_palm_w, v3_palm_d, palm_r);
}

module v3_palm_box_left() {
    difference() {
        union() {
            // シェル(リブなし)
            difference() {
                intersection() {
                    linear_extrude(60) v3_palm_fp2d();
                    halfspace_below_top(0);
                }
                intersection() {
                    translate([0, 0, -1]) linear_extrude(62) offset(delta = -v3_wall) v3_palm_fp2d();
                    halfspace_below_top(-v3_top);
                }
            }
            // ジョイントタブ(楔面-3.2 .. 0 のスラブ。北端はネジ穴縁の肉1.5mmを確保)
            // 上面は天板と完全に面一: 伏せ印刷でタブも1層目からベッドに接する
            // (0.2下げるとタブだけ浮いて1層目が欠ける)
            for (jx = v3_pj_xs)
                intersection() {
                    translate([jx - 7, -3, 0]) cube([14, 10.7, 60]);
                    halfspace_below_top(0);
                    halfspace_above_top(-3.2);
                }
        }
        // タブのネジ穴(縦M3なべ用ストレート穴, KB側ボスのネジ穴位置 y=4.5)
        for (jx = v3_pj_xs)
            translate([jx, 4.5, kb_top_z(jx) - 4.5]) cylinder(d = 3.4, h = 6);
    }
}

module v3_palm_box_right() { mirror([1, 0, 0]) v3_palm_box_left(); }
// main file
include <v3_palm_box.scad>
// 天面をベッドに伏せて印刷(180°+tent 回転)
rotate([0, 180 + tent_angle, 0]) v3_palm_box_left();
